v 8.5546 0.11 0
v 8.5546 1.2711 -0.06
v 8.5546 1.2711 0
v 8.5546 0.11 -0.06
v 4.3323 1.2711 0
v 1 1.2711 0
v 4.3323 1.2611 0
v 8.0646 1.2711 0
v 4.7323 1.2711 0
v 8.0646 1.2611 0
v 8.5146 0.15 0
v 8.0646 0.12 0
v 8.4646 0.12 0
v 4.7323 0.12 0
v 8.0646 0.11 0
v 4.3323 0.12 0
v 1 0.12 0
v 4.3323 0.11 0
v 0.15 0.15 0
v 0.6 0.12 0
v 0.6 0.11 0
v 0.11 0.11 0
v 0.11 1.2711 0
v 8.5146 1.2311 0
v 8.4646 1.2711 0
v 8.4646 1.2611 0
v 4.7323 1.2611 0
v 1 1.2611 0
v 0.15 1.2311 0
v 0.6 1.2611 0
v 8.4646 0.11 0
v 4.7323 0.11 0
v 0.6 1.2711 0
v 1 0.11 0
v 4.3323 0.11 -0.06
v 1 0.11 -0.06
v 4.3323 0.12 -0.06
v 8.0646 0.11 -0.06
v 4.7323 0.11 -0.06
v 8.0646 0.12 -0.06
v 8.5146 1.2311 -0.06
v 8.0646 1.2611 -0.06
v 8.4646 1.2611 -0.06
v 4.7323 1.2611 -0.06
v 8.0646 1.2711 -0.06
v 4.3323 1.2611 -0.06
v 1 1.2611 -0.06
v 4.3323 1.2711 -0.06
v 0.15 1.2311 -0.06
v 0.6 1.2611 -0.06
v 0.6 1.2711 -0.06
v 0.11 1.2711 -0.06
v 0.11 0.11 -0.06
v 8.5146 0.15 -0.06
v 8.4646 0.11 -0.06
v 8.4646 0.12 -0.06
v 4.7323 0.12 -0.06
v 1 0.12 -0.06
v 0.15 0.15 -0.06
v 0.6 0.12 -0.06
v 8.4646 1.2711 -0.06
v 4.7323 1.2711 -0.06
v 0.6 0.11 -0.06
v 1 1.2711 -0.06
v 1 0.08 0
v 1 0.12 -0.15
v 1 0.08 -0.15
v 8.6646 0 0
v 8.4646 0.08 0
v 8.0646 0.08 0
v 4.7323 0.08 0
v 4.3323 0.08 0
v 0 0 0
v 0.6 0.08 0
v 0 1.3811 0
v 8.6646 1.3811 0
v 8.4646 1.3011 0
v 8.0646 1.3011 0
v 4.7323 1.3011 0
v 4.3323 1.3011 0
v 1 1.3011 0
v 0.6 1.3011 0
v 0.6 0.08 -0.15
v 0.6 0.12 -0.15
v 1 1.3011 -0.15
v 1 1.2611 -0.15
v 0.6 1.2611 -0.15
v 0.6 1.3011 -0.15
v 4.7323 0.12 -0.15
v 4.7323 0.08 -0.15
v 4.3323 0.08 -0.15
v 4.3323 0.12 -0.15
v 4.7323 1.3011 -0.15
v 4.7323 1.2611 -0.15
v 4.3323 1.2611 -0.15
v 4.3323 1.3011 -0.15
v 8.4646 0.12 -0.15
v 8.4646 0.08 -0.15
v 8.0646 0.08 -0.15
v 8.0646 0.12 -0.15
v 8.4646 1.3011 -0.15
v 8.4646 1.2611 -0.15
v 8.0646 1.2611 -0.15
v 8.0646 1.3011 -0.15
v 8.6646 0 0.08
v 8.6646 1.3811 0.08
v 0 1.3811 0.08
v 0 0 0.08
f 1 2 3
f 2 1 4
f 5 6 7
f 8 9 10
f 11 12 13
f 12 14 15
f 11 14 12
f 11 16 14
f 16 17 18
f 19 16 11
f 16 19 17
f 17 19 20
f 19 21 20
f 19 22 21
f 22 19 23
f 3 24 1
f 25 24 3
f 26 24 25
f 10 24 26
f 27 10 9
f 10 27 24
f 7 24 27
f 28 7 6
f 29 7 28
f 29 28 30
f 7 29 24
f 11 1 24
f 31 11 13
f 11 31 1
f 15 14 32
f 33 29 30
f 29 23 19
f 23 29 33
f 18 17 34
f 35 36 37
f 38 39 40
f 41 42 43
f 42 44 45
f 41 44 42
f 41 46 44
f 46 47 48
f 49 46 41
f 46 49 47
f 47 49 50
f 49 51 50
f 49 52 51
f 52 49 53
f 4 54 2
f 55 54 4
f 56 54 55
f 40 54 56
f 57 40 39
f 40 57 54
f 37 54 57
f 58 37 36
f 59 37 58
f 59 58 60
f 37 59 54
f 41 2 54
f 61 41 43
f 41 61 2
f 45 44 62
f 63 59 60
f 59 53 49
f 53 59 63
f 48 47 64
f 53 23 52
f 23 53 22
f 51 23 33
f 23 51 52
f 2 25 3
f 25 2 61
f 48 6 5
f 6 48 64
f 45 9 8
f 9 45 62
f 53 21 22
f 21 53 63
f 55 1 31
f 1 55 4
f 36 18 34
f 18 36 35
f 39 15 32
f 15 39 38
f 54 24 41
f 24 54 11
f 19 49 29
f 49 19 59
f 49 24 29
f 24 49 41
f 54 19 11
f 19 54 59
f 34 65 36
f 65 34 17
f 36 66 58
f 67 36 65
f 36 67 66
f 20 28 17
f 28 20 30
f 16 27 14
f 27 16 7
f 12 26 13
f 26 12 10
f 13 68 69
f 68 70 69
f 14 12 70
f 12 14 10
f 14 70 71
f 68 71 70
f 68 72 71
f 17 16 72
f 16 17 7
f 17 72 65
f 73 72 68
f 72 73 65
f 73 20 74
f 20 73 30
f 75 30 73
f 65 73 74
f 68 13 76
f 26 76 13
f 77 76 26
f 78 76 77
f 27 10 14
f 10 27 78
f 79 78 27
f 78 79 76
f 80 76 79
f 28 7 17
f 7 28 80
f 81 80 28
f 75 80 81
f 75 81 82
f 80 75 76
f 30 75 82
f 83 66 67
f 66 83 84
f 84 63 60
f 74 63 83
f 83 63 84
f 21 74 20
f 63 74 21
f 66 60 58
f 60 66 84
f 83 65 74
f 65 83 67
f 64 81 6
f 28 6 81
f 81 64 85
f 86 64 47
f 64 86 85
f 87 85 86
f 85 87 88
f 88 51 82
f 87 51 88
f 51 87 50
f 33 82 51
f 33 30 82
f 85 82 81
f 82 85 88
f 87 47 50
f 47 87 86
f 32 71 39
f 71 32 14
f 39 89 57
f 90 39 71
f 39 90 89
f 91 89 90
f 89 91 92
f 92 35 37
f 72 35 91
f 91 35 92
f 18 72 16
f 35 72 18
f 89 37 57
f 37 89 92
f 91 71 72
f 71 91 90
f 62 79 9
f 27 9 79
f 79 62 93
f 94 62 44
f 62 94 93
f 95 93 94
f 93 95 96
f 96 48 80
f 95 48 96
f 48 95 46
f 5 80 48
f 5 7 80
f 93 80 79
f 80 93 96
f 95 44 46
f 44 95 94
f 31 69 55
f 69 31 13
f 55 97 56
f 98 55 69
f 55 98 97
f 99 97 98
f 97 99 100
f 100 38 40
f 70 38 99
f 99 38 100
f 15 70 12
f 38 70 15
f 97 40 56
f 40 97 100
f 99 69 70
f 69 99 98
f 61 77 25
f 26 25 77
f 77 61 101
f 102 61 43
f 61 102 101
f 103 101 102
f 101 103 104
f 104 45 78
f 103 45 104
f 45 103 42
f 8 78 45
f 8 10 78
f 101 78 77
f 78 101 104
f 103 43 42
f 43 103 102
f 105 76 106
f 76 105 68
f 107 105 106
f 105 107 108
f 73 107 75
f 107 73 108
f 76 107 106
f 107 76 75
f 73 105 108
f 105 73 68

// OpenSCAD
// Industrial 12-Node Quantum Hub - Heavy-Duty Dust-Proof Locking Lid
$fn = 64;

// Matches the 215mm x 30mm PCB footprint constraints
pcb_length   = 215.0 * 0.0393701; // Inches (~8.46")
pcb_width    = 30.0  * 0.0393701; // Inches (~1.18")
wall         = 0.10;               // Wall thickness 
lid_thickness = 0.08;              // Core lid thickness
snap_clearance = 0.01;             // Mechanical tolerance allowance

module industrial_locking_lid() {
    union() {
        // 1. Primary Lid Protective Shield Plate
        cube([pcb_length + (wall * 2), pcb_width + (wall * 2), lid_thickness], center=false);
        
        // 2. Continuous Internal Dual-Lip Dust Gasket Channel
        // Seals out industrial overspray and particulate matter
        translate([wall + snap_clearance, wall + snap_clearance, -0.06])
            difference() {
                cube([pcb_length - (snap_clearance * 2), pcb_width - (snap_clearance * 2), 0.06]);
                translate([0.04, 0.04, -0.01])
                    cube([pcb_length - (snap_clearance * 2) - 0.08, pcb_width - (snap_clearance * 2) - 0.08, 0.08]);
            }
            
        // 3. Heavy-Duty Side Locking Tabs (Snaps into Main Chassis Base)
        // Positioned symmetrically to distribute locking pressure evenly
        for (tab_x = [0.5, pcb_length / 2, pcb_length - 0.5]) {
            // Front side locking tabs
            translate([tab_x + wall, wall - 0.02, -0.15])
                cube([0.40, 0.04, 0.15]);
            // Rear side locking tabs
            translate([tab_x + wall, pcb_width + wall - 0.02, -0.15])
                cube([0.40, 0.04, 0.15]);
        }
    }
}

industrial_locking_lid();
